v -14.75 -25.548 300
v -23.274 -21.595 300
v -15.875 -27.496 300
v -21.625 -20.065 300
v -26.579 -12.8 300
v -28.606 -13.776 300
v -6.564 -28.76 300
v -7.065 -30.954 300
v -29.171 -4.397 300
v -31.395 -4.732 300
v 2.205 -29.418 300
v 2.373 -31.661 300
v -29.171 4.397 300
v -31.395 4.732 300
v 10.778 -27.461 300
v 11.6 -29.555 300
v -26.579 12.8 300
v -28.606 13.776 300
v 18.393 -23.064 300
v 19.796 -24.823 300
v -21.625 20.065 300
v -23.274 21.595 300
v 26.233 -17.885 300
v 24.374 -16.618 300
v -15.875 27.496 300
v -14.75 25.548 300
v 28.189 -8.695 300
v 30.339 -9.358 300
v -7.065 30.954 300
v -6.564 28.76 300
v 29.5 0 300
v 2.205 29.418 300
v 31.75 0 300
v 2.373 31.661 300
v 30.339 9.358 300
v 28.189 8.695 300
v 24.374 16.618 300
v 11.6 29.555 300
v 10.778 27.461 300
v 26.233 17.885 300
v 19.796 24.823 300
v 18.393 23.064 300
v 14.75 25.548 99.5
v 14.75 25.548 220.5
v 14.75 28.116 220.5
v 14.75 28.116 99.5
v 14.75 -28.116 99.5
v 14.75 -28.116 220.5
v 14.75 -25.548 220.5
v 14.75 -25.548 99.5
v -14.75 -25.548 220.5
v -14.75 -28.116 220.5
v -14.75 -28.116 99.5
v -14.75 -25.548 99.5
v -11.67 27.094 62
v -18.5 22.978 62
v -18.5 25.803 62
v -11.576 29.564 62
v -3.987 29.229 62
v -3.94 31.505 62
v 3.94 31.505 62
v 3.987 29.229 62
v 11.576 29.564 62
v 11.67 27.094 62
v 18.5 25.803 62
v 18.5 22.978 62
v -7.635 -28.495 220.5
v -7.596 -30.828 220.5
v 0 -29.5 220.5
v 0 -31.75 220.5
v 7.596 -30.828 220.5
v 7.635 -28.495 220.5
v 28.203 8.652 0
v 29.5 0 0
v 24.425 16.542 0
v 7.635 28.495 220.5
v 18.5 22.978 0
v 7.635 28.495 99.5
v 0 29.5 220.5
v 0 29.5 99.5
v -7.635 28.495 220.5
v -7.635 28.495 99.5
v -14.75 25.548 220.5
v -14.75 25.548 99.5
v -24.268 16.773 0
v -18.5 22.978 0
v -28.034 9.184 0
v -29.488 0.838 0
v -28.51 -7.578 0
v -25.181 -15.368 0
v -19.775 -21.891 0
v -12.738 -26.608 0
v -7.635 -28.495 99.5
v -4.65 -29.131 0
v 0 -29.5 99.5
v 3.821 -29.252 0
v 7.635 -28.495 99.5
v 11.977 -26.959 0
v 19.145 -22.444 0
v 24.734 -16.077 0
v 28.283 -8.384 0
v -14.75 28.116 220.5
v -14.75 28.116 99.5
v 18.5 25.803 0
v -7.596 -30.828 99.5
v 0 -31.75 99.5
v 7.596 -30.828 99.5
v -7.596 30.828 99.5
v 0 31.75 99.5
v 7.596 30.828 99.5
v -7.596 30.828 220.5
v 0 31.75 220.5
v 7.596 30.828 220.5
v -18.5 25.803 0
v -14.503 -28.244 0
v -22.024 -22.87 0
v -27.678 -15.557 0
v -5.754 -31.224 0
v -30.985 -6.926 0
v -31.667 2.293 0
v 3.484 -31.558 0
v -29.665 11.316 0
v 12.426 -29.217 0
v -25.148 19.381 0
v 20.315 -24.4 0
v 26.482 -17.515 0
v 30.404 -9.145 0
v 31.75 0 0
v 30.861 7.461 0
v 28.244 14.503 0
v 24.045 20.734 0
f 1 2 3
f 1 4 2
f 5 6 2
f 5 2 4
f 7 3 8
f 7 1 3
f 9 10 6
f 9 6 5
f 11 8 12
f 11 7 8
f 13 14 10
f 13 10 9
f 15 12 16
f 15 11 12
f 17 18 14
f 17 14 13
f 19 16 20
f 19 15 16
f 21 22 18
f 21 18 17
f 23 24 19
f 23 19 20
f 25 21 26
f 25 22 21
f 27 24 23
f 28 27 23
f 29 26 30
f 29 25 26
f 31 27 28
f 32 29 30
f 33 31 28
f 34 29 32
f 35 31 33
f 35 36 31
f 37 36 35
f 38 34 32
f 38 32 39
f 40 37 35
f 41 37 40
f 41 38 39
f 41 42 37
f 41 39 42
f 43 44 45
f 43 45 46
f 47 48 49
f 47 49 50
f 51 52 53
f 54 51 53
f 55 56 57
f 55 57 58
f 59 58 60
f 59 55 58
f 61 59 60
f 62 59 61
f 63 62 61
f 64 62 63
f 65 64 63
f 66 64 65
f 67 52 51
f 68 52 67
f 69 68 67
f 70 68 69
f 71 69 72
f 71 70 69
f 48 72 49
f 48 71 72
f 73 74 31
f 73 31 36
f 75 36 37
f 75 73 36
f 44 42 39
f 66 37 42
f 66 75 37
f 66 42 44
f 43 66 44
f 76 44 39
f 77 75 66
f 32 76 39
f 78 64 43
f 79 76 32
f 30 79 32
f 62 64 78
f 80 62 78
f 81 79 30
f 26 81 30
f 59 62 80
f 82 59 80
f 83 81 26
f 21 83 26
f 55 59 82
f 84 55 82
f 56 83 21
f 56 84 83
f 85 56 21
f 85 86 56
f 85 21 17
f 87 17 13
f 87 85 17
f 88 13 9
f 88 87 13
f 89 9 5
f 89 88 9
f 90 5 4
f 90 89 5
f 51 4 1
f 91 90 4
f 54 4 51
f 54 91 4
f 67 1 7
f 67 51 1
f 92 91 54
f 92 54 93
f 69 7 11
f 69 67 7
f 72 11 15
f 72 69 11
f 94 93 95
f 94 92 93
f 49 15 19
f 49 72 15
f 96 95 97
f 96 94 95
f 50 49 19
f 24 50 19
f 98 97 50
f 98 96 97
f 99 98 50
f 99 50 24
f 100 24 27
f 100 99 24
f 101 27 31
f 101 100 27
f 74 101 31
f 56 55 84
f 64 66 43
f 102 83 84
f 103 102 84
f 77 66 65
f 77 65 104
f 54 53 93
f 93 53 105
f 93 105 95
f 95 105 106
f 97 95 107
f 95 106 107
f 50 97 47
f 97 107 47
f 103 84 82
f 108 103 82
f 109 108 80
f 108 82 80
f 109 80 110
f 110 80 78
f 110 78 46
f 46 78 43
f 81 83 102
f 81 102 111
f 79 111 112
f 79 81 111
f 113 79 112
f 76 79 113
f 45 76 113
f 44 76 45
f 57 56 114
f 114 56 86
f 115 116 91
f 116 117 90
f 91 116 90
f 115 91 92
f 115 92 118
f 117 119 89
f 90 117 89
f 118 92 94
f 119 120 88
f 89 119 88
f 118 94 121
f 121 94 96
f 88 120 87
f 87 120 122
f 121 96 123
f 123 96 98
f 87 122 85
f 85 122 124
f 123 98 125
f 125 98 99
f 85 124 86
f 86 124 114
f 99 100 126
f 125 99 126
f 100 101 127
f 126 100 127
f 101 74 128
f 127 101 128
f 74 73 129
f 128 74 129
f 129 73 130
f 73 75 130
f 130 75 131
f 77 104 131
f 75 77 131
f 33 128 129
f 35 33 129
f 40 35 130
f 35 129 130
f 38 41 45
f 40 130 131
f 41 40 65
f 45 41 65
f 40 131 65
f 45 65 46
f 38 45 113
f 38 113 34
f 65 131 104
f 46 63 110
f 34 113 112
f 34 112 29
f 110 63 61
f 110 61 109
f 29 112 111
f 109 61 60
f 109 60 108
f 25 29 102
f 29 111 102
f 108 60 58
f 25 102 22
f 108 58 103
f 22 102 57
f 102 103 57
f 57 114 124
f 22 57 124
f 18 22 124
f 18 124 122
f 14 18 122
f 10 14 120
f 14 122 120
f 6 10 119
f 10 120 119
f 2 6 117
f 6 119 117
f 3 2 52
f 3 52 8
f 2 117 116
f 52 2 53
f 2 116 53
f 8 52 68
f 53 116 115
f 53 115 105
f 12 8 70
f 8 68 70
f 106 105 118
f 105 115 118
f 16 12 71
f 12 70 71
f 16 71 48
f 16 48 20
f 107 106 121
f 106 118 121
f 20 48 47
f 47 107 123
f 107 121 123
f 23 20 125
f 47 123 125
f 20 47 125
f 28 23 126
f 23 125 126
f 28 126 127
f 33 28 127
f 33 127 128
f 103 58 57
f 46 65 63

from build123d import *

# Parameters (mm, degrees)
SKETCH1_R               = 31.75
SKETCH1_R_2             = 29.5
BOSS_EXTRUDE1_DEPTH     = 300
CUT_EXTRUDE1_REACH      = 305.342
CUT_EXTRUDE1_END_RADIUS = 31.75
SKETCH2_W               = 37
SKETCH2_H               = 62
CUT_EXTRUDE2_DEPTH      = 304.341597873
CUT_EXTRUDE2_DEPTH_BACK = 304.341597873
SKETCH4_W               = 29.5
SKETCH4_H               = 121


with BuildPart() as part:
    # Sketch1 → Boss-Extrude1 (new body)
    with BuildSketch(Plane.XY):
        Circle(SKETCH1_R)
        Circle(SKETCH1_R_2, mode=Mode.SUBTRACT)
    extrude(amount=BOSS_EXTRUDE1_DEPTH)

    # Cut-Extrude1: up to this cylinder (the profile starts inside it)
    cut_extrude1_end = Plane(origin=(0, 0, 31), z_dir=(0, 0, -1)) * Cylinder(CUT_EXTRUDE1_END_RADIUS, 675.184, mode=Mode.PRIVATE)
    # Sketch2 → Cut-Extrude1 (cut, up to the surface)
    with BuildSketch(Plane(origin=(0, 0, 0), x_dir=(1, 0, 0), z_dir=(0, 1, 0)), mode=Mode.PRIVATE) as cut_extrude1_sk1:
        with Locations((0, -31)):
            Rectangle(SKETCH2_W, SKETCH2_H)
    cut_extrude1_tool1 = extrude(cut_extrude1_sk1.sketch, amount=CUT_EXTRUDE1_REACH, mode=Mode.PRIVATE) & cut_extrude1_end
    add(cut_extrude1_tool1.solids().sort_by_distance((0, 0, 31))[0], mode=Mode.SUBTRACT)

    # Sketch4 → Cut-Extrude2 (cut, two sides: drawn at the far end of the back side and taken through both)
    with BuildSketch(Plane(origin=(0, 0, 0), x_dir=(1, 0, 0), z_dir=(0, 1, 0)).offset(-CUT_EXTRUDE2_DEPTH_BACK)):
        with Locations((0, -160)):
            Rectangle(SKETCH4_W, SKETCH4_H)
    extrude(amount=CUT_EXTRUDE2_DEPTH + CUT_EXTRUDE2_DEPTH_BACK, mode=Mode.SUBTRACT)


solid = part.part
